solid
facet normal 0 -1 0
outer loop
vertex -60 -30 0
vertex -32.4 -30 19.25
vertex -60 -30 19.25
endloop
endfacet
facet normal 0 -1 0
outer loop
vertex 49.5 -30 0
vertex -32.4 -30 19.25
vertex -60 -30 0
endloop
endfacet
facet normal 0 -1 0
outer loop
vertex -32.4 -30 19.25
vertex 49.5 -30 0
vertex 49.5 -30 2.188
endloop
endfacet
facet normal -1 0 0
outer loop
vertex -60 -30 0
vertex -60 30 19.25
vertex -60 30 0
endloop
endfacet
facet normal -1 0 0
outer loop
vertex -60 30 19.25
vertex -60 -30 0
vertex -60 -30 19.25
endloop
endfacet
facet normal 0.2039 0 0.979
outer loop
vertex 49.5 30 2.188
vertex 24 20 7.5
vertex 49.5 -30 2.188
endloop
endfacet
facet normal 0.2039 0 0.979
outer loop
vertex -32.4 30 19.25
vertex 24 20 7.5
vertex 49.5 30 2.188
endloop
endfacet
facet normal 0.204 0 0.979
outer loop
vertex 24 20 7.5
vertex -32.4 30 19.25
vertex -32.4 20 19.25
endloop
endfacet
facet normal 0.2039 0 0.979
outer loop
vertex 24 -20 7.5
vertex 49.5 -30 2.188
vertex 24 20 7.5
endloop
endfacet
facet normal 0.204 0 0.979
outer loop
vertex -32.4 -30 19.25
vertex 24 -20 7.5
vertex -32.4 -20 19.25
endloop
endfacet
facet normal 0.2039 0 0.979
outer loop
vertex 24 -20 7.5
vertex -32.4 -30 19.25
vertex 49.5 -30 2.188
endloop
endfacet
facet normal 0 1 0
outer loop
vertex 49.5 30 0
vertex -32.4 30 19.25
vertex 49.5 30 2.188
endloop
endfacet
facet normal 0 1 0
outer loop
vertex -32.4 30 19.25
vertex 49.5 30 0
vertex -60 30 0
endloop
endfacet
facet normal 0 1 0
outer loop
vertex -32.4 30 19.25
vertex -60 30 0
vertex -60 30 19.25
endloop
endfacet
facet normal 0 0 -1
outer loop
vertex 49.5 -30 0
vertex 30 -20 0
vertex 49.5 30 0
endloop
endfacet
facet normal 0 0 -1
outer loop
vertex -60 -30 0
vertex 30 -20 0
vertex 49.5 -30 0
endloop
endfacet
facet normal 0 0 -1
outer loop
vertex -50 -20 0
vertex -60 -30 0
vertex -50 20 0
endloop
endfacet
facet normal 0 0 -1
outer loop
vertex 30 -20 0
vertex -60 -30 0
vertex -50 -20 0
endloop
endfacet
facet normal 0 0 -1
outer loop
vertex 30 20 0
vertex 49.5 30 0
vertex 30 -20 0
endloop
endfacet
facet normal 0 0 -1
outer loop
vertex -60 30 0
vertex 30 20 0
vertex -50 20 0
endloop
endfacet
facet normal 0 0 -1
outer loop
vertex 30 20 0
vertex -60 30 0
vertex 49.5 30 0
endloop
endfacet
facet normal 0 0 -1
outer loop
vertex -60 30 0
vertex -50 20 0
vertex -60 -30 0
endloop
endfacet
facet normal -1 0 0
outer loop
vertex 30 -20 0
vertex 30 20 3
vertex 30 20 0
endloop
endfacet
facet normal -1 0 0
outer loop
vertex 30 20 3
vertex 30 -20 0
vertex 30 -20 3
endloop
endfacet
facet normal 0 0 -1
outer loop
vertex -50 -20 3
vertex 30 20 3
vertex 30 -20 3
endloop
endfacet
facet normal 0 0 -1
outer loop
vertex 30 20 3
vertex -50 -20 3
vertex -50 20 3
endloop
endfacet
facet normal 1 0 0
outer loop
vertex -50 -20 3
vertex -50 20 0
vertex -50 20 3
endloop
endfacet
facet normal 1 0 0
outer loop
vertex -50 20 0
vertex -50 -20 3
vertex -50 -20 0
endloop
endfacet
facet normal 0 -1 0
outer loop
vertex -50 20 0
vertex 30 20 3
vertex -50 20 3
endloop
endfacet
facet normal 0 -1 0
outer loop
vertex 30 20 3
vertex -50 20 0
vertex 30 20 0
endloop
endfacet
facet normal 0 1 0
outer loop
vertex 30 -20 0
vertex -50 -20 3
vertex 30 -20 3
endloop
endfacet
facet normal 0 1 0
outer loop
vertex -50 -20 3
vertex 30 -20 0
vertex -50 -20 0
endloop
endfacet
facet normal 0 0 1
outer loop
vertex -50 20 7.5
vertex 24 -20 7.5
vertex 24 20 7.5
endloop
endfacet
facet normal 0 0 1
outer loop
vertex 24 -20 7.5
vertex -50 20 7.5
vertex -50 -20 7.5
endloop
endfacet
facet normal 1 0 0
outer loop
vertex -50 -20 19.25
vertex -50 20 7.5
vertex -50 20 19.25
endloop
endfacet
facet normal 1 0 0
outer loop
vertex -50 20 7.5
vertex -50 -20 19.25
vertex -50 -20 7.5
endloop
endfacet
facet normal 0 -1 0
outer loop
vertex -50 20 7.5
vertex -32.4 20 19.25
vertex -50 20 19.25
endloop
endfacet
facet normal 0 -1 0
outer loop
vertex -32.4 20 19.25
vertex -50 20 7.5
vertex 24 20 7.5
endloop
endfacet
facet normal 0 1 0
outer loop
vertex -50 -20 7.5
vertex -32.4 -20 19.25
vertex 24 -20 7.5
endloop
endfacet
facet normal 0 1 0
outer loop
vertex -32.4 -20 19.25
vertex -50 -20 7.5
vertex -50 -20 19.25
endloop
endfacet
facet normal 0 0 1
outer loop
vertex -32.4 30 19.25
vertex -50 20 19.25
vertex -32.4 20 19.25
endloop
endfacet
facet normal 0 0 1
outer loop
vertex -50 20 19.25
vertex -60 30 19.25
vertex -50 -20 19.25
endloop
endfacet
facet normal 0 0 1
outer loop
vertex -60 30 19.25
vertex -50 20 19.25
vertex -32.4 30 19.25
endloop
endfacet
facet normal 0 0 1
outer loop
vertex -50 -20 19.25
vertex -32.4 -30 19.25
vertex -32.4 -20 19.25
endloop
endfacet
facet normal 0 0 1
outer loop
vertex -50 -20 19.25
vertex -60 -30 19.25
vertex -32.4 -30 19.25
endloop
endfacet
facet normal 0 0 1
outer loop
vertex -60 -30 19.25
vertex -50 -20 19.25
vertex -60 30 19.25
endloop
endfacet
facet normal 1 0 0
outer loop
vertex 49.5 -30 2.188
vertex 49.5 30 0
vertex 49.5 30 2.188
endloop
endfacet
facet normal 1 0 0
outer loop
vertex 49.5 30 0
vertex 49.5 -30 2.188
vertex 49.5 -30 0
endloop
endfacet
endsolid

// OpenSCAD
/*
Door stopper

Author:
- Daniel K. Schneider, TECFA, University of Geneva, April 2010

Copyright and credits:
- Attribution - Non-Commercial - Share Alike license.
  (http://creativecommons.org/licenses/by-nc-sa/3.0/)

Purpose:
- Stops doors from banging when it is windy :)
- Offer it as a 3D visiting card, publicity for programs, etc.

Usage:
- Add some text on top of the flat area. E.g. use Netfabb to create and to position the 3D letters, then merge with Meshlab (or buy Netfabb Pro).
- Add text underneath, or use the door_stopper_simple () module. Text underneath should stretch in both the x/y directions and have z=0 ! Else you will have too much overhang.
- I recommend using a fat, round font like Arial Rounded MT Bold
- For some kinds of buildings, you may have to adapt the OpenScad code, i.e. you can make it flatter or higher. e.g. for indoor use, a much flatter version also can do in most houses.
- Of course, you could make it shorter and narrower, but this will seriously limit printing readable text. If you make it much smaller, consider printing slowly with fine filament and reduced layer thickness.

Default values to use for text size and positioning
- Text height underneath = 3mm ; Z position = 0
- Text height on top = between 2 and 4 mm ; Z position = 7.5

Printing with the RapMan / skeinforge
- Printing is *much* easier with PLA since it doesn't warp, but PLA is not as solid as ABS.
- ABS will probably warp, so:
-- take the print bed off and sand it again
-- make a really sticky and large raft (3mm thickness and 15 mm extra margin) and print it slowly !
-- even then, be prepared to file away the rounded bottom or if it warps just be bit, accept that it will be rounded since that hasn't much impact on door stopping ;)
-- use a fan maybe, but then raise all temperatures by 5 or more (depending on how much your ventilator will cool), e.g. 243 for the raft and 256 for the rest.
- Use a good infill if you want it solid, e.g. 25 %
- Flow rate: about 450 for a 4mm layer thickness and 16 head speed.

*/ 


// ------------------------- Pick your module
// Comment/uncomment one

door_stopper ();
// door_stopper_simple ();

// -------------------------- door stopper with text underneath 

module door_stopper ()
{
    height = 25  ;
    length = 120 ;
    width= 60 ;
    half_width  = width / 2;
    
    borders = 10; // 1 cm on each side

    // params for bottom inset
    bottom_cube_length = length - 4 * borders;
    bottom_cube_width = width - 2 * borders;
    bottom_cube_height = 6.0 ; // 3mm in / 3mm outsite
    bottom_z = 0;

    // params for top inset
    top_cube_length = length - 4 * borders;
    top_cube_width  = width - 2 * borders;
    top_cube_height = height ;  // make it big enough // 25
    top_z = height/2 + 7.5 ; //  12.5 + 7.5 = 10 ; 10 - 2.5 = 7.5

    // param for tip
    tip_cut_pos = length/2 - 0.5;

    // param for top tip
    top_tip_pos = height + 0.5; 

    difference() {
	translate ([-length/2.0, 0, 0]) {
    	    polyhedron (	
	    		points = [[0, -half_width, height], [0, half_width, height], [0, half_width, 0], [0, -half_width, 0], [length, -half_width, 0], [length, half_width, 0]],
			triangles = [[0,3,2], [0,2,1], [3,0,4], [1,2,5], [0,5,4], [0,1,5],  [5,2,4], [4,2,3], ]);
	}
	// bottom inset
	translate ([-1 * borders, 0, bottom_z]) {
	    # cube ([bottom_cube_length,
		     bottom_cube_width,
		     bottom_cube_height],
		    center=true) ;
	}
	// top inset
	translate ([-1 * borders, 0, top_z]) {
	    # cube ([top_cube_length,
		     top_cube_width,
		     top_cube_height],
		    center=true) ;
	}
	// cut of the top tip a bit
	translate ([-1 *length/2, 0, top_tip_pos]) {
	    # cube ([length,
		     width+2,
		     height / 2],
		    center=true) ;
	}
	// cut of the front tip a bit
	translate ([tip_cut_pos, 0, 0]) {
	    # cube ([20,
		   width + 1,
		   height],
		  center=true) ;
	}
    }	    
}


// -------------------------- door stopper without text underneath 

module door_stopper_simple ()
{
    height = 20  ;
    length = 125 ;
    width= 40 ;
    half_width  = width / 2;
    
    borders = 10; // 1 cm on each side

    top_cube_length = length - 4 * borders;
    top_cube_width  = width - 2 * borders;
    top_cube_height = height ;  // make it big enough
    top_z = height/2 + 4 ; // adjust manually ;)

    tip_cut_pos = length/2 - 0.5;

    difference() {
	translate ([-length/2.0, 0, 0]) {
    	    polyhedron (	
	    		points = [[0, -half_width, height], [0, half_width, height], [0, half_width, 0], [0, -half_width, 0], [length, -half_width, 0], [length, half_width, 0]],
			triangles = [[0,3,2], [0,2,1], [3,0,4], [1,2,5], [0,5,4], [0,1,5],  [5,2,4], [4,2,3], ]);
	}

	// top inset
	translate ([-1 * borders, 0, top_z]) {
	    # cube ([top_cube_length,
		     top_cube_width,
		     top_cube_height],
		    center=true) ;
	}
	// cut of the tip a bit

	translate ([tip_cut_pos, 0, 0]) {
	    # cube ([20,
		     width + 1,
		     height],
		    center=true) ;
	}
    }
}
